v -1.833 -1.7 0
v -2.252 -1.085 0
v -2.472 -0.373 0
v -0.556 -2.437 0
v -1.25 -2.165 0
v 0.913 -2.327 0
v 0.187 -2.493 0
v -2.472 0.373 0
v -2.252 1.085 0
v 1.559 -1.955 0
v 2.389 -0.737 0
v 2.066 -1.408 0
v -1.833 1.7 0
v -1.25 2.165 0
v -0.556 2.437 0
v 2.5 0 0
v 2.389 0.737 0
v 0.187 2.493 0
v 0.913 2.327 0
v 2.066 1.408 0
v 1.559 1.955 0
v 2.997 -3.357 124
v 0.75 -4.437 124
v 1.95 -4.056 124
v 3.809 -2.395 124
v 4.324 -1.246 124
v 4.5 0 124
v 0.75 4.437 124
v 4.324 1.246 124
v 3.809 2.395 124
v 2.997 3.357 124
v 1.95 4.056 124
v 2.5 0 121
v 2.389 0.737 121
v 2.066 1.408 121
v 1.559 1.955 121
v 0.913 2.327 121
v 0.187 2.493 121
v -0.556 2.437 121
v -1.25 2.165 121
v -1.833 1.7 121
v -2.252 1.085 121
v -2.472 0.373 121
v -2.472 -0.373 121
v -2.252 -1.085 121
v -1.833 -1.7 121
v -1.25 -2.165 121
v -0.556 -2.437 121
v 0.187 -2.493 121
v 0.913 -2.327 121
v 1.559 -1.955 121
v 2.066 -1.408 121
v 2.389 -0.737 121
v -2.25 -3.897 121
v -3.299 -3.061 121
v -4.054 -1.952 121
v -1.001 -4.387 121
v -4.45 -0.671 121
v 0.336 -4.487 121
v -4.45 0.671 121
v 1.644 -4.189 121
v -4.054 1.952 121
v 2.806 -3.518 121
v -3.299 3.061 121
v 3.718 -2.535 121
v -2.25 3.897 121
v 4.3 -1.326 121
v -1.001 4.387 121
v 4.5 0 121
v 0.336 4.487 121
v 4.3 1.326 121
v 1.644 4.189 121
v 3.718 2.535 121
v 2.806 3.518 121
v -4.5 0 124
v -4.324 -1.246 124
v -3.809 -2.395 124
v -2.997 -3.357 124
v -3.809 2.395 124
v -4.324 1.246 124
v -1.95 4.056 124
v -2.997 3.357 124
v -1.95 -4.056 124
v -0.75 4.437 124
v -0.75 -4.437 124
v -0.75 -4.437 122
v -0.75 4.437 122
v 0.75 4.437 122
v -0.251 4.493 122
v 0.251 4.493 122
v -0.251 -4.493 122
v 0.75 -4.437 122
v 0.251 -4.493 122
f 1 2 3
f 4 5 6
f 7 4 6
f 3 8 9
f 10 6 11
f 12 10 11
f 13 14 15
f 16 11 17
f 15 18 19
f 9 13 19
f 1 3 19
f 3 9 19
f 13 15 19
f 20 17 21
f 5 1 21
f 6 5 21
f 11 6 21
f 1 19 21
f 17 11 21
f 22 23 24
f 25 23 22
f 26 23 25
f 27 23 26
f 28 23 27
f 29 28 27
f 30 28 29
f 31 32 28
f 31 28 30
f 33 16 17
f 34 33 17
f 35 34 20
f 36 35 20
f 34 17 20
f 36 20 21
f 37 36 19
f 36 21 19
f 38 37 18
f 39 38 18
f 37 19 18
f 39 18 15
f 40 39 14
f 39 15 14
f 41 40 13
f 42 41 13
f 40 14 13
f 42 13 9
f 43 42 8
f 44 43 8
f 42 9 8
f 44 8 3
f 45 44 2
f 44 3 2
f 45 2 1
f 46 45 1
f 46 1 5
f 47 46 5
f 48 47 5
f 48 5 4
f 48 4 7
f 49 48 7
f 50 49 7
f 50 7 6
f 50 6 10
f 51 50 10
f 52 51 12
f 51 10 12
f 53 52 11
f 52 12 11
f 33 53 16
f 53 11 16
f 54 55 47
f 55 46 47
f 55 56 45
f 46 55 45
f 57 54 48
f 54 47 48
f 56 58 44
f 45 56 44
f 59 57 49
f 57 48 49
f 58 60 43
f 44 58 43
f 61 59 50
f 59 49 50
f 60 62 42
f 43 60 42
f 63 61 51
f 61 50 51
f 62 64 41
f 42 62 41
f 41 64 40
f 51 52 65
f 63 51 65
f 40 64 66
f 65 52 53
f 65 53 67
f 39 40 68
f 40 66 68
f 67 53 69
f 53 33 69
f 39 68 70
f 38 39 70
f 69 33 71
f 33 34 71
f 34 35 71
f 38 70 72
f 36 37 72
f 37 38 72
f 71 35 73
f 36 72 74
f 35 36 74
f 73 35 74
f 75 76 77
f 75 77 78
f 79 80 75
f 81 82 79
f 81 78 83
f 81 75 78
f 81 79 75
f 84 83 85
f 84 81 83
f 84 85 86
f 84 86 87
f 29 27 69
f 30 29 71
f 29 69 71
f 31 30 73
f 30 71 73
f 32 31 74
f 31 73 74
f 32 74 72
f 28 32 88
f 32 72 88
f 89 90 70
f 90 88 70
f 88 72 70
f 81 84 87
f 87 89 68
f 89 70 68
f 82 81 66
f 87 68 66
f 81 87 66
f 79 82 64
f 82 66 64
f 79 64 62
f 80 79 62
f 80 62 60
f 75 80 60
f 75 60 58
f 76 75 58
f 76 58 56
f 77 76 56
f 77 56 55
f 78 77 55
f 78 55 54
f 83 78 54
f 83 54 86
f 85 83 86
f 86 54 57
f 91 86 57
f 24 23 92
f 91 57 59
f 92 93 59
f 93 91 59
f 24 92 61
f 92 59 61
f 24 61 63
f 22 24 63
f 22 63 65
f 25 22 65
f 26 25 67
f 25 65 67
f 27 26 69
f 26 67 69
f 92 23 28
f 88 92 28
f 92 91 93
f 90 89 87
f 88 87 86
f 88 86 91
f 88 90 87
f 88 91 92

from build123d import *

# Parameters (mm, degrees)
SKETCH_1_R          = 2.5
EXTRUDE_1_DEPTH     = 121
SKETCH_2_R          = 4.5
EXTRUDE_2_DEPTH     = 3
SKETCH_4_W          = 1.5
SKETCH_4_H          = 10.936891942
CUT_EXTRUDE_1_DEPTH = 2


with BuildPart() as part:
    # 草图1 → 凸台-拉伸1 (new body)
    with BuildSketch(Plane.XY):
        Circle(SKETCH_1_R)
    extrude(amount=EXTRUDE_1_DEPTH)

    # 草图2 → 凸台-拉伸2 (add)
    with BuildSketch(Plane.XY.offset(121)):
        Circle(SKETCH_2_R)
    extrude(amount=EXTRUDE_2_DEPTH)

    # 草图4 → 切除-拉伸1 (cut)
    with BuildSketch(Plane.XY.offset(124)):
        Rectangle(SKETCH_4_W, SKETCH_4_H)
    extrude(amount=-CUT_EXTRUDE_1_DEPTH, mode=Mode.SUBTRACT)


solid = part.part
